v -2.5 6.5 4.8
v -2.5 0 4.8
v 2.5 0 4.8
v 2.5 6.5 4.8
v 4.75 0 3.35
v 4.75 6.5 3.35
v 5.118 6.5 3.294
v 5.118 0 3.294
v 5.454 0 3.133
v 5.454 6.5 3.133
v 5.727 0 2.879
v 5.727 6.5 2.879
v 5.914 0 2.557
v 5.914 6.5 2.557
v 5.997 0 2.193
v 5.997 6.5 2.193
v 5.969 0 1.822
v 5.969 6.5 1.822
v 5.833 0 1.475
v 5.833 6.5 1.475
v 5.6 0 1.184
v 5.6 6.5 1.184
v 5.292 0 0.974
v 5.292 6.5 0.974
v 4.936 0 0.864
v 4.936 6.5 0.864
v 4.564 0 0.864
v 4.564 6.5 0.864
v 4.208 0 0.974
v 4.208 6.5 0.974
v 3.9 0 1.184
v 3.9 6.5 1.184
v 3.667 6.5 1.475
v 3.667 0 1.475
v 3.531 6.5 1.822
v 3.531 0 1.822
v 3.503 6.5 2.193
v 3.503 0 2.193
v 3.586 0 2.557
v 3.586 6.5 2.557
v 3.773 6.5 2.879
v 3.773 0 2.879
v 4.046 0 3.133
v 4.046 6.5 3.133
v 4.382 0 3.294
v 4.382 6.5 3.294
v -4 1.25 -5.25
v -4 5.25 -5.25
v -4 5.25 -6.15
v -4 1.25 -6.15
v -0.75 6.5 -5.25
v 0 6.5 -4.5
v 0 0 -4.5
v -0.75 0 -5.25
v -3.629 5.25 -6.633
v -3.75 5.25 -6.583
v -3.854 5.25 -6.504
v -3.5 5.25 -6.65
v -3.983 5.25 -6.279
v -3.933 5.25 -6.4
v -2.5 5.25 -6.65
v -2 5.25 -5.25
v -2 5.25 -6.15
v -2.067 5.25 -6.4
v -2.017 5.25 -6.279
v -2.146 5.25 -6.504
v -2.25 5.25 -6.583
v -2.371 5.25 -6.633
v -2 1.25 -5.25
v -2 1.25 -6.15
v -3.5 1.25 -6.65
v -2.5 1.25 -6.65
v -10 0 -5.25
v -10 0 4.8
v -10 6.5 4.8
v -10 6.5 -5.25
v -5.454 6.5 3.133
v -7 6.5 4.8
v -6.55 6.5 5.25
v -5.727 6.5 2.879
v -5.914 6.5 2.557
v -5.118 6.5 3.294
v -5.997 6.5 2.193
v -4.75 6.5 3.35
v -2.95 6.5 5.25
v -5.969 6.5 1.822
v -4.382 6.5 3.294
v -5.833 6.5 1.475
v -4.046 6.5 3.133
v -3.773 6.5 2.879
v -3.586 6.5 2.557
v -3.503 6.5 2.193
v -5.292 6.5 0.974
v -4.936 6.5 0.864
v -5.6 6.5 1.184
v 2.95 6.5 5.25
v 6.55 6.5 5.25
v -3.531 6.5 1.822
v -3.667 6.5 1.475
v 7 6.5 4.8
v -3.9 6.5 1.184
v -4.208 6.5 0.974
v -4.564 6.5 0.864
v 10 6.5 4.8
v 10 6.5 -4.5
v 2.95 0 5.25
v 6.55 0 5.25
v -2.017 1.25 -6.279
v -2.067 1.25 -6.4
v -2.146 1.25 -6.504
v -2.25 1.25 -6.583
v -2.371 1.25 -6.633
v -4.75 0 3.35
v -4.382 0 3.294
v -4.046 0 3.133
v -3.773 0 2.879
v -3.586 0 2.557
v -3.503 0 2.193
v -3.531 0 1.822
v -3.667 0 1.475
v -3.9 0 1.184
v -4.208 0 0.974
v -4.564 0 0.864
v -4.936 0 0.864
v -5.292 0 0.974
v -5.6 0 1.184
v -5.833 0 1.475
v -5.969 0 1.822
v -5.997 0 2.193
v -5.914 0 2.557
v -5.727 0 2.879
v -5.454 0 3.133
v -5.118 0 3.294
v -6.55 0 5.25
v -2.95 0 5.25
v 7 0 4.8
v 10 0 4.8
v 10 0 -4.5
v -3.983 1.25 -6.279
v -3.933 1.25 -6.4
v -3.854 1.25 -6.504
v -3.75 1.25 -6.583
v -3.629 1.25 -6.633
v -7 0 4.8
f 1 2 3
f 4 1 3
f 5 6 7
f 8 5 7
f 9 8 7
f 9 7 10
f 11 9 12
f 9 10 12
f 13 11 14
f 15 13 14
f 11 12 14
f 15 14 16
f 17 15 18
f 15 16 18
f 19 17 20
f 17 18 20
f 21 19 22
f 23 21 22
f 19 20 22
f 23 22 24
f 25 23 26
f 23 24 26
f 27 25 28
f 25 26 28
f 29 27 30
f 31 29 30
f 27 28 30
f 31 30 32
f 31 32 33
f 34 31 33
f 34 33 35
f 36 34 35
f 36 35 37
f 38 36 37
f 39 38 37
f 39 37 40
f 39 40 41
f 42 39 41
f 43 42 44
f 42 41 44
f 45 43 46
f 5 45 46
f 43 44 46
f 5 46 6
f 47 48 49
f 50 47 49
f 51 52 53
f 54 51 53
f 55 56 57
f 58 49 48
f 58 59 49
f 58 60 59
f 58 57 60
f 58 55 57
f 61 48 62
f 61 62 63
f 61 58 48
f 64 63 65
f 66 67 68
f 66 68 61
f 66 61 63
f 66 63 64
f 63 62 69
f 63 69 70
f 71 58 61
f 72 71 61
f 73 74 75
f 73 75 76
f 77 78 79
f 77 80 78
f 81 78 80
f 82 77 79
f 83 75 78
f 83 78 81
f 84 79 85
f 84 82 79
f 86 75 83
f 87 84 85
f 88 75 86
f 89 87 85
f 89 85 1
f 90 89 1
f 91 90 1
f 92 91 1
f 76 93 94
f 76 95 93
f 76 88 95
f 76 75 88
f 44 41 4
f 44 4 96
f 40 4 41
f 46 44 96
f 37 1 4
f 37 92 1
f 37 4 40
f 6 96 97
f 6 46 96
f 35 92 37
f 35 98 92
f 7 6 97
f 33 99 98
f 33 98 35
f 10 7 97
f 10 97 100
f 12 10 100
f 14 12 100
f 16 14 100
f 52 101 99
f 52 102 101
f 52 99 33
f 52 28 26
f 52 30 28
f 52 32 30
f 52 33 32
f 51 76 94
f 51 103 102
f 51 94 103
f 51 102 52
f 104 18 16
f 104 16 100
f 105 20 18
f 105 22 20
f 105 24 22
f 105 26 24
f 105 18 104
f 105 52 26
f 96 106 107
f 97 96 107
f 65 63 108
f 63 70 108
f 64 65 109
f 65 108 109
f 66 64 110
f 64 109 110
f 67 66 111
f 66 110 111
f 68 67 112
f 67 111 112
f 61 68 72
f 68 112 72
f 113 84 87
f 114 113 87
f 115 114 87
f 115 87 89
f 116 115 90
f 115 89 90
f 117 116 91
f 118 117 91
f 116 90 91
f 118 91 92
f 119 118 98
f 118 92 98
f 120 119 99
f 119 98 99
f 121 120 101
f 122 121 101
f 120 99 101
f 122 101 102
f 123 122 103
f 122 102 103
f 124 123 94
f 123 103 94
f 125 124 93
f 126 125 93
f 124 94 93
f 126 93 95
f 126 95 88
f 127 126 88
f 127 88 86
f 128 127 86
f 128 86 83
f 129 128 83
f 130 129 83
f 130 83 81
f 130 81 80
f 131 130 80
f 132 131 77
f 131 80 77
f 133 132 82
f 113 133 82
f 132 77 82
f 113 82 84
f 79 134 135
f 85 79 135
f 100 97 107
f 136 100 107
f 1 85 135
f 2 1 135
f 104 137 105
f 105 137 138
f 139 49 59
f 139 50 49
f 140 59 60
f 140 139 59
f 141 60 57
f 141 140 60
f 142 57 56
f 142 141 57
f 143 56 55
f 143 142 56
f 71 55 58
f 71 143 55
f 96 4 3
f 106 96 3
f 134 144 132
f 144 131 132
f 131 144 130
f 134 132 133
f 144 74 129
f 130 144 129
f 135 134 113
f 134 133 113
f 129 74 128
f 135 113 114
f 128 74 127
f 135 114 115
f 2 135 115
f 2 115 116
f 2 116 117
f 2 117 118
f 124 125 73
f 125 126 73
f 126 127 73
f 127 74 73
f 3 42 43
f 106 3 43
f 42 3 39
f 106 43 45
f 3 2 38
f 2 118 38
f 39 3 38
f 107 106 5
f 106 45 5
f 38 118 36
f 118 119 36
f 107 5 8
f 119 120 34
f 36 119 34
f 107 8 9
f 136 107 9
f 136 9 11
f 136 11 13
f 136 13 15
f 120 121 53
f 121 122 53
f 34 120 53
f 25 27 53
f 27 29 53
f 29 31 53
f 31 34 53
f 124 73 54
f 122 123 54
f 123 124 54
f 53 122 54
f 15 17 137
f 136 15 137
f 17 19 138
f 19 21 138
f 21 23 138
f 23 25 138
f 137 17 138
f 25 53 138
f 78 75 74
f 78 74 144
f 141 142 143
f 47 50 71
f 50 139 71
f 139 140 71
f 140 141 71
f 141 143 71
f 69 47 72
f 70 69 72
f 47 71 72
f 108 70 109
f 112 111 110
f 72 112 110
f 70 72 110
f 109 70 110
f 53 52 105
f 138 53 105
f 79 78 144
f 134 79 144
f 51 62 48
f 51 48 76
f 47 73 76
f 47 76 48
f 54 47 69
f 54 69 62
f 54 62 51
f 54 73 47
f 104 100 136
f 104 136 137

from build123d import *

# Parameters (mm, degrees)
SKETCH_1_W          = 20
SKETCH_1_H          = 10.5
EXTRUDE_1_DEPTH     = 6.5
SKETCH_2_R          = 1.25
CUT_EXTRUDE_1_DEPTH = 6.5
SKETCH_3_W          = 4.44626532
SKETCH_3_H          = 1.008872475
SKETCH_3_W_2        = 5
SKETCH_3_W_3        = 3.65317203
CUT_EXTRUDE_2_DEPTH = 6.5
CHAMFER_1_SIZE      = 0.45
SKETCH_4_W          = 10.31021277
SKETCH_4_H          = 1.008783122
CUT_EXTRUDE_3_DEPTH = 6.5
CHAMFER_2_SIZE      = 0.75
SKETCH_5_W          = 2
SKETCH_5_H          = 1.4
EXTRUDE_2_DEPTH     = 4
FILLET_1_R          = 0.5


with BuildPart() as part:
    # 스케치1 → 보스-돌출1 (new body)
    with BuildSketch(Plane(origin=(0, 0, 0), x_dir=(1, 0, 0), z_dir=(0, 1, 0))):
        Rectangle(SKETCH_1_W, SKETCH_1_H)
    extrude(amount=EXTRUDE_1_DEPTH)

    # 스케치2 → 컷-돌출1 (cut)
    with BuildSketch(Plane(origin=(0, 6.5, 0), x_dir=(1, 0, 0), z_dir=(0, 1, 0))):
        with Locations(Location((-4.75, -2.1, 0), (0, 0, 270))):
            Circle(SKETCH_2_R)
        with Locations(Location((4.75, -2.1, 0), (0, 0, 270))):
            Circle(SKETCH_2_R)
    extrude(amount=-CUT_EXTRUDE_1_DEPTH, mode=Mode.SUBTRACT)

    # 스케치3 → 컷-돌출2 (cut)
    with BuildSketch(Plane(origin=(0, 6.5, 0), x_dir=(1, 0, 0), z_dir=(0, 1, 0))):
        with Locations((-9.22313266, -5.304436238)):
            Rectangle(SKETCH_3_W, SKETCH_3_H)
        with Locations((0, -5.304436238)):
            Rectangle(SKETCH_3_W_2, SKETCH_3_H)
        with Locations((8.826586015, -5.304436238)):
            Rectangle(SKETCH_3_W_3, SKETCH_3_H)
    extrude(amount=-CUT_EXTRUDE_2_DEPTH, mode=Mode.SUBTRACT)

    # 모따기1
    chamfer_1_edges = [part.edges().sort_by_distance(p)[0] for p in [
        (7, 3.25, 5.25),
        (2.5, 3.25, 5.25),
        (-2.5, 3.25, 5.25),
        (-7, 3.25, 5.25),
    ]]
    chamfer(chamfer_1_edges, length=CHAMFER_1_SIZE - 0.0001)  # a hair under: the kernel refuses the full size

    # 스케치4 → 컷-돌출3 (cut)
    with BuildSketch(Plane(origin=(0, 6.5, 0), x_dir=(1, 0, 0), z_dir=(0, 1, 0))):
        with Locations((5.155106385, 5.004391561)):
            Rectangle(SKETCH_4_W, SKETCH_4_H)
    extrude(amount=-CUT_EXTRUDE_3_DEPTH, mode=Mode.SUBTRACT)

    # 모따기2
    chamfer_2_edges = [part.edges().sort_by_distance(p)[0] for p in [
        (0, 3.25, -5.25),
    ]]
    chamfer(chamfer_2_edges, length=CHAMFER_2_SIZE - 0.0001)  # a hair under: the kernel refuses the full size

    # 스케치5 → 보스-돌출2 (add)
    with BuildSketch(Plane(origin=(0, 5.25, 0), x_dir=(1, 0, 0), z_dir=(0, 1, 0))):
        with Locations((-3, 5.95)):
            Rectangle(SKETCH_5_W, SKETCH_5_H)
    extrude(amount=-EXTRUDE_2_DEPTH)

    # 필렛1
    fillet_1_edges = [part.edges().sort_by_distance(p)[0] for p in [
        (-4, 3.25, -6.65),
        (-2, 3.25, -6.65),
    ]]
    fillet(fillet_1_edges, radius=FILLET_1_R)


solid = part.part
